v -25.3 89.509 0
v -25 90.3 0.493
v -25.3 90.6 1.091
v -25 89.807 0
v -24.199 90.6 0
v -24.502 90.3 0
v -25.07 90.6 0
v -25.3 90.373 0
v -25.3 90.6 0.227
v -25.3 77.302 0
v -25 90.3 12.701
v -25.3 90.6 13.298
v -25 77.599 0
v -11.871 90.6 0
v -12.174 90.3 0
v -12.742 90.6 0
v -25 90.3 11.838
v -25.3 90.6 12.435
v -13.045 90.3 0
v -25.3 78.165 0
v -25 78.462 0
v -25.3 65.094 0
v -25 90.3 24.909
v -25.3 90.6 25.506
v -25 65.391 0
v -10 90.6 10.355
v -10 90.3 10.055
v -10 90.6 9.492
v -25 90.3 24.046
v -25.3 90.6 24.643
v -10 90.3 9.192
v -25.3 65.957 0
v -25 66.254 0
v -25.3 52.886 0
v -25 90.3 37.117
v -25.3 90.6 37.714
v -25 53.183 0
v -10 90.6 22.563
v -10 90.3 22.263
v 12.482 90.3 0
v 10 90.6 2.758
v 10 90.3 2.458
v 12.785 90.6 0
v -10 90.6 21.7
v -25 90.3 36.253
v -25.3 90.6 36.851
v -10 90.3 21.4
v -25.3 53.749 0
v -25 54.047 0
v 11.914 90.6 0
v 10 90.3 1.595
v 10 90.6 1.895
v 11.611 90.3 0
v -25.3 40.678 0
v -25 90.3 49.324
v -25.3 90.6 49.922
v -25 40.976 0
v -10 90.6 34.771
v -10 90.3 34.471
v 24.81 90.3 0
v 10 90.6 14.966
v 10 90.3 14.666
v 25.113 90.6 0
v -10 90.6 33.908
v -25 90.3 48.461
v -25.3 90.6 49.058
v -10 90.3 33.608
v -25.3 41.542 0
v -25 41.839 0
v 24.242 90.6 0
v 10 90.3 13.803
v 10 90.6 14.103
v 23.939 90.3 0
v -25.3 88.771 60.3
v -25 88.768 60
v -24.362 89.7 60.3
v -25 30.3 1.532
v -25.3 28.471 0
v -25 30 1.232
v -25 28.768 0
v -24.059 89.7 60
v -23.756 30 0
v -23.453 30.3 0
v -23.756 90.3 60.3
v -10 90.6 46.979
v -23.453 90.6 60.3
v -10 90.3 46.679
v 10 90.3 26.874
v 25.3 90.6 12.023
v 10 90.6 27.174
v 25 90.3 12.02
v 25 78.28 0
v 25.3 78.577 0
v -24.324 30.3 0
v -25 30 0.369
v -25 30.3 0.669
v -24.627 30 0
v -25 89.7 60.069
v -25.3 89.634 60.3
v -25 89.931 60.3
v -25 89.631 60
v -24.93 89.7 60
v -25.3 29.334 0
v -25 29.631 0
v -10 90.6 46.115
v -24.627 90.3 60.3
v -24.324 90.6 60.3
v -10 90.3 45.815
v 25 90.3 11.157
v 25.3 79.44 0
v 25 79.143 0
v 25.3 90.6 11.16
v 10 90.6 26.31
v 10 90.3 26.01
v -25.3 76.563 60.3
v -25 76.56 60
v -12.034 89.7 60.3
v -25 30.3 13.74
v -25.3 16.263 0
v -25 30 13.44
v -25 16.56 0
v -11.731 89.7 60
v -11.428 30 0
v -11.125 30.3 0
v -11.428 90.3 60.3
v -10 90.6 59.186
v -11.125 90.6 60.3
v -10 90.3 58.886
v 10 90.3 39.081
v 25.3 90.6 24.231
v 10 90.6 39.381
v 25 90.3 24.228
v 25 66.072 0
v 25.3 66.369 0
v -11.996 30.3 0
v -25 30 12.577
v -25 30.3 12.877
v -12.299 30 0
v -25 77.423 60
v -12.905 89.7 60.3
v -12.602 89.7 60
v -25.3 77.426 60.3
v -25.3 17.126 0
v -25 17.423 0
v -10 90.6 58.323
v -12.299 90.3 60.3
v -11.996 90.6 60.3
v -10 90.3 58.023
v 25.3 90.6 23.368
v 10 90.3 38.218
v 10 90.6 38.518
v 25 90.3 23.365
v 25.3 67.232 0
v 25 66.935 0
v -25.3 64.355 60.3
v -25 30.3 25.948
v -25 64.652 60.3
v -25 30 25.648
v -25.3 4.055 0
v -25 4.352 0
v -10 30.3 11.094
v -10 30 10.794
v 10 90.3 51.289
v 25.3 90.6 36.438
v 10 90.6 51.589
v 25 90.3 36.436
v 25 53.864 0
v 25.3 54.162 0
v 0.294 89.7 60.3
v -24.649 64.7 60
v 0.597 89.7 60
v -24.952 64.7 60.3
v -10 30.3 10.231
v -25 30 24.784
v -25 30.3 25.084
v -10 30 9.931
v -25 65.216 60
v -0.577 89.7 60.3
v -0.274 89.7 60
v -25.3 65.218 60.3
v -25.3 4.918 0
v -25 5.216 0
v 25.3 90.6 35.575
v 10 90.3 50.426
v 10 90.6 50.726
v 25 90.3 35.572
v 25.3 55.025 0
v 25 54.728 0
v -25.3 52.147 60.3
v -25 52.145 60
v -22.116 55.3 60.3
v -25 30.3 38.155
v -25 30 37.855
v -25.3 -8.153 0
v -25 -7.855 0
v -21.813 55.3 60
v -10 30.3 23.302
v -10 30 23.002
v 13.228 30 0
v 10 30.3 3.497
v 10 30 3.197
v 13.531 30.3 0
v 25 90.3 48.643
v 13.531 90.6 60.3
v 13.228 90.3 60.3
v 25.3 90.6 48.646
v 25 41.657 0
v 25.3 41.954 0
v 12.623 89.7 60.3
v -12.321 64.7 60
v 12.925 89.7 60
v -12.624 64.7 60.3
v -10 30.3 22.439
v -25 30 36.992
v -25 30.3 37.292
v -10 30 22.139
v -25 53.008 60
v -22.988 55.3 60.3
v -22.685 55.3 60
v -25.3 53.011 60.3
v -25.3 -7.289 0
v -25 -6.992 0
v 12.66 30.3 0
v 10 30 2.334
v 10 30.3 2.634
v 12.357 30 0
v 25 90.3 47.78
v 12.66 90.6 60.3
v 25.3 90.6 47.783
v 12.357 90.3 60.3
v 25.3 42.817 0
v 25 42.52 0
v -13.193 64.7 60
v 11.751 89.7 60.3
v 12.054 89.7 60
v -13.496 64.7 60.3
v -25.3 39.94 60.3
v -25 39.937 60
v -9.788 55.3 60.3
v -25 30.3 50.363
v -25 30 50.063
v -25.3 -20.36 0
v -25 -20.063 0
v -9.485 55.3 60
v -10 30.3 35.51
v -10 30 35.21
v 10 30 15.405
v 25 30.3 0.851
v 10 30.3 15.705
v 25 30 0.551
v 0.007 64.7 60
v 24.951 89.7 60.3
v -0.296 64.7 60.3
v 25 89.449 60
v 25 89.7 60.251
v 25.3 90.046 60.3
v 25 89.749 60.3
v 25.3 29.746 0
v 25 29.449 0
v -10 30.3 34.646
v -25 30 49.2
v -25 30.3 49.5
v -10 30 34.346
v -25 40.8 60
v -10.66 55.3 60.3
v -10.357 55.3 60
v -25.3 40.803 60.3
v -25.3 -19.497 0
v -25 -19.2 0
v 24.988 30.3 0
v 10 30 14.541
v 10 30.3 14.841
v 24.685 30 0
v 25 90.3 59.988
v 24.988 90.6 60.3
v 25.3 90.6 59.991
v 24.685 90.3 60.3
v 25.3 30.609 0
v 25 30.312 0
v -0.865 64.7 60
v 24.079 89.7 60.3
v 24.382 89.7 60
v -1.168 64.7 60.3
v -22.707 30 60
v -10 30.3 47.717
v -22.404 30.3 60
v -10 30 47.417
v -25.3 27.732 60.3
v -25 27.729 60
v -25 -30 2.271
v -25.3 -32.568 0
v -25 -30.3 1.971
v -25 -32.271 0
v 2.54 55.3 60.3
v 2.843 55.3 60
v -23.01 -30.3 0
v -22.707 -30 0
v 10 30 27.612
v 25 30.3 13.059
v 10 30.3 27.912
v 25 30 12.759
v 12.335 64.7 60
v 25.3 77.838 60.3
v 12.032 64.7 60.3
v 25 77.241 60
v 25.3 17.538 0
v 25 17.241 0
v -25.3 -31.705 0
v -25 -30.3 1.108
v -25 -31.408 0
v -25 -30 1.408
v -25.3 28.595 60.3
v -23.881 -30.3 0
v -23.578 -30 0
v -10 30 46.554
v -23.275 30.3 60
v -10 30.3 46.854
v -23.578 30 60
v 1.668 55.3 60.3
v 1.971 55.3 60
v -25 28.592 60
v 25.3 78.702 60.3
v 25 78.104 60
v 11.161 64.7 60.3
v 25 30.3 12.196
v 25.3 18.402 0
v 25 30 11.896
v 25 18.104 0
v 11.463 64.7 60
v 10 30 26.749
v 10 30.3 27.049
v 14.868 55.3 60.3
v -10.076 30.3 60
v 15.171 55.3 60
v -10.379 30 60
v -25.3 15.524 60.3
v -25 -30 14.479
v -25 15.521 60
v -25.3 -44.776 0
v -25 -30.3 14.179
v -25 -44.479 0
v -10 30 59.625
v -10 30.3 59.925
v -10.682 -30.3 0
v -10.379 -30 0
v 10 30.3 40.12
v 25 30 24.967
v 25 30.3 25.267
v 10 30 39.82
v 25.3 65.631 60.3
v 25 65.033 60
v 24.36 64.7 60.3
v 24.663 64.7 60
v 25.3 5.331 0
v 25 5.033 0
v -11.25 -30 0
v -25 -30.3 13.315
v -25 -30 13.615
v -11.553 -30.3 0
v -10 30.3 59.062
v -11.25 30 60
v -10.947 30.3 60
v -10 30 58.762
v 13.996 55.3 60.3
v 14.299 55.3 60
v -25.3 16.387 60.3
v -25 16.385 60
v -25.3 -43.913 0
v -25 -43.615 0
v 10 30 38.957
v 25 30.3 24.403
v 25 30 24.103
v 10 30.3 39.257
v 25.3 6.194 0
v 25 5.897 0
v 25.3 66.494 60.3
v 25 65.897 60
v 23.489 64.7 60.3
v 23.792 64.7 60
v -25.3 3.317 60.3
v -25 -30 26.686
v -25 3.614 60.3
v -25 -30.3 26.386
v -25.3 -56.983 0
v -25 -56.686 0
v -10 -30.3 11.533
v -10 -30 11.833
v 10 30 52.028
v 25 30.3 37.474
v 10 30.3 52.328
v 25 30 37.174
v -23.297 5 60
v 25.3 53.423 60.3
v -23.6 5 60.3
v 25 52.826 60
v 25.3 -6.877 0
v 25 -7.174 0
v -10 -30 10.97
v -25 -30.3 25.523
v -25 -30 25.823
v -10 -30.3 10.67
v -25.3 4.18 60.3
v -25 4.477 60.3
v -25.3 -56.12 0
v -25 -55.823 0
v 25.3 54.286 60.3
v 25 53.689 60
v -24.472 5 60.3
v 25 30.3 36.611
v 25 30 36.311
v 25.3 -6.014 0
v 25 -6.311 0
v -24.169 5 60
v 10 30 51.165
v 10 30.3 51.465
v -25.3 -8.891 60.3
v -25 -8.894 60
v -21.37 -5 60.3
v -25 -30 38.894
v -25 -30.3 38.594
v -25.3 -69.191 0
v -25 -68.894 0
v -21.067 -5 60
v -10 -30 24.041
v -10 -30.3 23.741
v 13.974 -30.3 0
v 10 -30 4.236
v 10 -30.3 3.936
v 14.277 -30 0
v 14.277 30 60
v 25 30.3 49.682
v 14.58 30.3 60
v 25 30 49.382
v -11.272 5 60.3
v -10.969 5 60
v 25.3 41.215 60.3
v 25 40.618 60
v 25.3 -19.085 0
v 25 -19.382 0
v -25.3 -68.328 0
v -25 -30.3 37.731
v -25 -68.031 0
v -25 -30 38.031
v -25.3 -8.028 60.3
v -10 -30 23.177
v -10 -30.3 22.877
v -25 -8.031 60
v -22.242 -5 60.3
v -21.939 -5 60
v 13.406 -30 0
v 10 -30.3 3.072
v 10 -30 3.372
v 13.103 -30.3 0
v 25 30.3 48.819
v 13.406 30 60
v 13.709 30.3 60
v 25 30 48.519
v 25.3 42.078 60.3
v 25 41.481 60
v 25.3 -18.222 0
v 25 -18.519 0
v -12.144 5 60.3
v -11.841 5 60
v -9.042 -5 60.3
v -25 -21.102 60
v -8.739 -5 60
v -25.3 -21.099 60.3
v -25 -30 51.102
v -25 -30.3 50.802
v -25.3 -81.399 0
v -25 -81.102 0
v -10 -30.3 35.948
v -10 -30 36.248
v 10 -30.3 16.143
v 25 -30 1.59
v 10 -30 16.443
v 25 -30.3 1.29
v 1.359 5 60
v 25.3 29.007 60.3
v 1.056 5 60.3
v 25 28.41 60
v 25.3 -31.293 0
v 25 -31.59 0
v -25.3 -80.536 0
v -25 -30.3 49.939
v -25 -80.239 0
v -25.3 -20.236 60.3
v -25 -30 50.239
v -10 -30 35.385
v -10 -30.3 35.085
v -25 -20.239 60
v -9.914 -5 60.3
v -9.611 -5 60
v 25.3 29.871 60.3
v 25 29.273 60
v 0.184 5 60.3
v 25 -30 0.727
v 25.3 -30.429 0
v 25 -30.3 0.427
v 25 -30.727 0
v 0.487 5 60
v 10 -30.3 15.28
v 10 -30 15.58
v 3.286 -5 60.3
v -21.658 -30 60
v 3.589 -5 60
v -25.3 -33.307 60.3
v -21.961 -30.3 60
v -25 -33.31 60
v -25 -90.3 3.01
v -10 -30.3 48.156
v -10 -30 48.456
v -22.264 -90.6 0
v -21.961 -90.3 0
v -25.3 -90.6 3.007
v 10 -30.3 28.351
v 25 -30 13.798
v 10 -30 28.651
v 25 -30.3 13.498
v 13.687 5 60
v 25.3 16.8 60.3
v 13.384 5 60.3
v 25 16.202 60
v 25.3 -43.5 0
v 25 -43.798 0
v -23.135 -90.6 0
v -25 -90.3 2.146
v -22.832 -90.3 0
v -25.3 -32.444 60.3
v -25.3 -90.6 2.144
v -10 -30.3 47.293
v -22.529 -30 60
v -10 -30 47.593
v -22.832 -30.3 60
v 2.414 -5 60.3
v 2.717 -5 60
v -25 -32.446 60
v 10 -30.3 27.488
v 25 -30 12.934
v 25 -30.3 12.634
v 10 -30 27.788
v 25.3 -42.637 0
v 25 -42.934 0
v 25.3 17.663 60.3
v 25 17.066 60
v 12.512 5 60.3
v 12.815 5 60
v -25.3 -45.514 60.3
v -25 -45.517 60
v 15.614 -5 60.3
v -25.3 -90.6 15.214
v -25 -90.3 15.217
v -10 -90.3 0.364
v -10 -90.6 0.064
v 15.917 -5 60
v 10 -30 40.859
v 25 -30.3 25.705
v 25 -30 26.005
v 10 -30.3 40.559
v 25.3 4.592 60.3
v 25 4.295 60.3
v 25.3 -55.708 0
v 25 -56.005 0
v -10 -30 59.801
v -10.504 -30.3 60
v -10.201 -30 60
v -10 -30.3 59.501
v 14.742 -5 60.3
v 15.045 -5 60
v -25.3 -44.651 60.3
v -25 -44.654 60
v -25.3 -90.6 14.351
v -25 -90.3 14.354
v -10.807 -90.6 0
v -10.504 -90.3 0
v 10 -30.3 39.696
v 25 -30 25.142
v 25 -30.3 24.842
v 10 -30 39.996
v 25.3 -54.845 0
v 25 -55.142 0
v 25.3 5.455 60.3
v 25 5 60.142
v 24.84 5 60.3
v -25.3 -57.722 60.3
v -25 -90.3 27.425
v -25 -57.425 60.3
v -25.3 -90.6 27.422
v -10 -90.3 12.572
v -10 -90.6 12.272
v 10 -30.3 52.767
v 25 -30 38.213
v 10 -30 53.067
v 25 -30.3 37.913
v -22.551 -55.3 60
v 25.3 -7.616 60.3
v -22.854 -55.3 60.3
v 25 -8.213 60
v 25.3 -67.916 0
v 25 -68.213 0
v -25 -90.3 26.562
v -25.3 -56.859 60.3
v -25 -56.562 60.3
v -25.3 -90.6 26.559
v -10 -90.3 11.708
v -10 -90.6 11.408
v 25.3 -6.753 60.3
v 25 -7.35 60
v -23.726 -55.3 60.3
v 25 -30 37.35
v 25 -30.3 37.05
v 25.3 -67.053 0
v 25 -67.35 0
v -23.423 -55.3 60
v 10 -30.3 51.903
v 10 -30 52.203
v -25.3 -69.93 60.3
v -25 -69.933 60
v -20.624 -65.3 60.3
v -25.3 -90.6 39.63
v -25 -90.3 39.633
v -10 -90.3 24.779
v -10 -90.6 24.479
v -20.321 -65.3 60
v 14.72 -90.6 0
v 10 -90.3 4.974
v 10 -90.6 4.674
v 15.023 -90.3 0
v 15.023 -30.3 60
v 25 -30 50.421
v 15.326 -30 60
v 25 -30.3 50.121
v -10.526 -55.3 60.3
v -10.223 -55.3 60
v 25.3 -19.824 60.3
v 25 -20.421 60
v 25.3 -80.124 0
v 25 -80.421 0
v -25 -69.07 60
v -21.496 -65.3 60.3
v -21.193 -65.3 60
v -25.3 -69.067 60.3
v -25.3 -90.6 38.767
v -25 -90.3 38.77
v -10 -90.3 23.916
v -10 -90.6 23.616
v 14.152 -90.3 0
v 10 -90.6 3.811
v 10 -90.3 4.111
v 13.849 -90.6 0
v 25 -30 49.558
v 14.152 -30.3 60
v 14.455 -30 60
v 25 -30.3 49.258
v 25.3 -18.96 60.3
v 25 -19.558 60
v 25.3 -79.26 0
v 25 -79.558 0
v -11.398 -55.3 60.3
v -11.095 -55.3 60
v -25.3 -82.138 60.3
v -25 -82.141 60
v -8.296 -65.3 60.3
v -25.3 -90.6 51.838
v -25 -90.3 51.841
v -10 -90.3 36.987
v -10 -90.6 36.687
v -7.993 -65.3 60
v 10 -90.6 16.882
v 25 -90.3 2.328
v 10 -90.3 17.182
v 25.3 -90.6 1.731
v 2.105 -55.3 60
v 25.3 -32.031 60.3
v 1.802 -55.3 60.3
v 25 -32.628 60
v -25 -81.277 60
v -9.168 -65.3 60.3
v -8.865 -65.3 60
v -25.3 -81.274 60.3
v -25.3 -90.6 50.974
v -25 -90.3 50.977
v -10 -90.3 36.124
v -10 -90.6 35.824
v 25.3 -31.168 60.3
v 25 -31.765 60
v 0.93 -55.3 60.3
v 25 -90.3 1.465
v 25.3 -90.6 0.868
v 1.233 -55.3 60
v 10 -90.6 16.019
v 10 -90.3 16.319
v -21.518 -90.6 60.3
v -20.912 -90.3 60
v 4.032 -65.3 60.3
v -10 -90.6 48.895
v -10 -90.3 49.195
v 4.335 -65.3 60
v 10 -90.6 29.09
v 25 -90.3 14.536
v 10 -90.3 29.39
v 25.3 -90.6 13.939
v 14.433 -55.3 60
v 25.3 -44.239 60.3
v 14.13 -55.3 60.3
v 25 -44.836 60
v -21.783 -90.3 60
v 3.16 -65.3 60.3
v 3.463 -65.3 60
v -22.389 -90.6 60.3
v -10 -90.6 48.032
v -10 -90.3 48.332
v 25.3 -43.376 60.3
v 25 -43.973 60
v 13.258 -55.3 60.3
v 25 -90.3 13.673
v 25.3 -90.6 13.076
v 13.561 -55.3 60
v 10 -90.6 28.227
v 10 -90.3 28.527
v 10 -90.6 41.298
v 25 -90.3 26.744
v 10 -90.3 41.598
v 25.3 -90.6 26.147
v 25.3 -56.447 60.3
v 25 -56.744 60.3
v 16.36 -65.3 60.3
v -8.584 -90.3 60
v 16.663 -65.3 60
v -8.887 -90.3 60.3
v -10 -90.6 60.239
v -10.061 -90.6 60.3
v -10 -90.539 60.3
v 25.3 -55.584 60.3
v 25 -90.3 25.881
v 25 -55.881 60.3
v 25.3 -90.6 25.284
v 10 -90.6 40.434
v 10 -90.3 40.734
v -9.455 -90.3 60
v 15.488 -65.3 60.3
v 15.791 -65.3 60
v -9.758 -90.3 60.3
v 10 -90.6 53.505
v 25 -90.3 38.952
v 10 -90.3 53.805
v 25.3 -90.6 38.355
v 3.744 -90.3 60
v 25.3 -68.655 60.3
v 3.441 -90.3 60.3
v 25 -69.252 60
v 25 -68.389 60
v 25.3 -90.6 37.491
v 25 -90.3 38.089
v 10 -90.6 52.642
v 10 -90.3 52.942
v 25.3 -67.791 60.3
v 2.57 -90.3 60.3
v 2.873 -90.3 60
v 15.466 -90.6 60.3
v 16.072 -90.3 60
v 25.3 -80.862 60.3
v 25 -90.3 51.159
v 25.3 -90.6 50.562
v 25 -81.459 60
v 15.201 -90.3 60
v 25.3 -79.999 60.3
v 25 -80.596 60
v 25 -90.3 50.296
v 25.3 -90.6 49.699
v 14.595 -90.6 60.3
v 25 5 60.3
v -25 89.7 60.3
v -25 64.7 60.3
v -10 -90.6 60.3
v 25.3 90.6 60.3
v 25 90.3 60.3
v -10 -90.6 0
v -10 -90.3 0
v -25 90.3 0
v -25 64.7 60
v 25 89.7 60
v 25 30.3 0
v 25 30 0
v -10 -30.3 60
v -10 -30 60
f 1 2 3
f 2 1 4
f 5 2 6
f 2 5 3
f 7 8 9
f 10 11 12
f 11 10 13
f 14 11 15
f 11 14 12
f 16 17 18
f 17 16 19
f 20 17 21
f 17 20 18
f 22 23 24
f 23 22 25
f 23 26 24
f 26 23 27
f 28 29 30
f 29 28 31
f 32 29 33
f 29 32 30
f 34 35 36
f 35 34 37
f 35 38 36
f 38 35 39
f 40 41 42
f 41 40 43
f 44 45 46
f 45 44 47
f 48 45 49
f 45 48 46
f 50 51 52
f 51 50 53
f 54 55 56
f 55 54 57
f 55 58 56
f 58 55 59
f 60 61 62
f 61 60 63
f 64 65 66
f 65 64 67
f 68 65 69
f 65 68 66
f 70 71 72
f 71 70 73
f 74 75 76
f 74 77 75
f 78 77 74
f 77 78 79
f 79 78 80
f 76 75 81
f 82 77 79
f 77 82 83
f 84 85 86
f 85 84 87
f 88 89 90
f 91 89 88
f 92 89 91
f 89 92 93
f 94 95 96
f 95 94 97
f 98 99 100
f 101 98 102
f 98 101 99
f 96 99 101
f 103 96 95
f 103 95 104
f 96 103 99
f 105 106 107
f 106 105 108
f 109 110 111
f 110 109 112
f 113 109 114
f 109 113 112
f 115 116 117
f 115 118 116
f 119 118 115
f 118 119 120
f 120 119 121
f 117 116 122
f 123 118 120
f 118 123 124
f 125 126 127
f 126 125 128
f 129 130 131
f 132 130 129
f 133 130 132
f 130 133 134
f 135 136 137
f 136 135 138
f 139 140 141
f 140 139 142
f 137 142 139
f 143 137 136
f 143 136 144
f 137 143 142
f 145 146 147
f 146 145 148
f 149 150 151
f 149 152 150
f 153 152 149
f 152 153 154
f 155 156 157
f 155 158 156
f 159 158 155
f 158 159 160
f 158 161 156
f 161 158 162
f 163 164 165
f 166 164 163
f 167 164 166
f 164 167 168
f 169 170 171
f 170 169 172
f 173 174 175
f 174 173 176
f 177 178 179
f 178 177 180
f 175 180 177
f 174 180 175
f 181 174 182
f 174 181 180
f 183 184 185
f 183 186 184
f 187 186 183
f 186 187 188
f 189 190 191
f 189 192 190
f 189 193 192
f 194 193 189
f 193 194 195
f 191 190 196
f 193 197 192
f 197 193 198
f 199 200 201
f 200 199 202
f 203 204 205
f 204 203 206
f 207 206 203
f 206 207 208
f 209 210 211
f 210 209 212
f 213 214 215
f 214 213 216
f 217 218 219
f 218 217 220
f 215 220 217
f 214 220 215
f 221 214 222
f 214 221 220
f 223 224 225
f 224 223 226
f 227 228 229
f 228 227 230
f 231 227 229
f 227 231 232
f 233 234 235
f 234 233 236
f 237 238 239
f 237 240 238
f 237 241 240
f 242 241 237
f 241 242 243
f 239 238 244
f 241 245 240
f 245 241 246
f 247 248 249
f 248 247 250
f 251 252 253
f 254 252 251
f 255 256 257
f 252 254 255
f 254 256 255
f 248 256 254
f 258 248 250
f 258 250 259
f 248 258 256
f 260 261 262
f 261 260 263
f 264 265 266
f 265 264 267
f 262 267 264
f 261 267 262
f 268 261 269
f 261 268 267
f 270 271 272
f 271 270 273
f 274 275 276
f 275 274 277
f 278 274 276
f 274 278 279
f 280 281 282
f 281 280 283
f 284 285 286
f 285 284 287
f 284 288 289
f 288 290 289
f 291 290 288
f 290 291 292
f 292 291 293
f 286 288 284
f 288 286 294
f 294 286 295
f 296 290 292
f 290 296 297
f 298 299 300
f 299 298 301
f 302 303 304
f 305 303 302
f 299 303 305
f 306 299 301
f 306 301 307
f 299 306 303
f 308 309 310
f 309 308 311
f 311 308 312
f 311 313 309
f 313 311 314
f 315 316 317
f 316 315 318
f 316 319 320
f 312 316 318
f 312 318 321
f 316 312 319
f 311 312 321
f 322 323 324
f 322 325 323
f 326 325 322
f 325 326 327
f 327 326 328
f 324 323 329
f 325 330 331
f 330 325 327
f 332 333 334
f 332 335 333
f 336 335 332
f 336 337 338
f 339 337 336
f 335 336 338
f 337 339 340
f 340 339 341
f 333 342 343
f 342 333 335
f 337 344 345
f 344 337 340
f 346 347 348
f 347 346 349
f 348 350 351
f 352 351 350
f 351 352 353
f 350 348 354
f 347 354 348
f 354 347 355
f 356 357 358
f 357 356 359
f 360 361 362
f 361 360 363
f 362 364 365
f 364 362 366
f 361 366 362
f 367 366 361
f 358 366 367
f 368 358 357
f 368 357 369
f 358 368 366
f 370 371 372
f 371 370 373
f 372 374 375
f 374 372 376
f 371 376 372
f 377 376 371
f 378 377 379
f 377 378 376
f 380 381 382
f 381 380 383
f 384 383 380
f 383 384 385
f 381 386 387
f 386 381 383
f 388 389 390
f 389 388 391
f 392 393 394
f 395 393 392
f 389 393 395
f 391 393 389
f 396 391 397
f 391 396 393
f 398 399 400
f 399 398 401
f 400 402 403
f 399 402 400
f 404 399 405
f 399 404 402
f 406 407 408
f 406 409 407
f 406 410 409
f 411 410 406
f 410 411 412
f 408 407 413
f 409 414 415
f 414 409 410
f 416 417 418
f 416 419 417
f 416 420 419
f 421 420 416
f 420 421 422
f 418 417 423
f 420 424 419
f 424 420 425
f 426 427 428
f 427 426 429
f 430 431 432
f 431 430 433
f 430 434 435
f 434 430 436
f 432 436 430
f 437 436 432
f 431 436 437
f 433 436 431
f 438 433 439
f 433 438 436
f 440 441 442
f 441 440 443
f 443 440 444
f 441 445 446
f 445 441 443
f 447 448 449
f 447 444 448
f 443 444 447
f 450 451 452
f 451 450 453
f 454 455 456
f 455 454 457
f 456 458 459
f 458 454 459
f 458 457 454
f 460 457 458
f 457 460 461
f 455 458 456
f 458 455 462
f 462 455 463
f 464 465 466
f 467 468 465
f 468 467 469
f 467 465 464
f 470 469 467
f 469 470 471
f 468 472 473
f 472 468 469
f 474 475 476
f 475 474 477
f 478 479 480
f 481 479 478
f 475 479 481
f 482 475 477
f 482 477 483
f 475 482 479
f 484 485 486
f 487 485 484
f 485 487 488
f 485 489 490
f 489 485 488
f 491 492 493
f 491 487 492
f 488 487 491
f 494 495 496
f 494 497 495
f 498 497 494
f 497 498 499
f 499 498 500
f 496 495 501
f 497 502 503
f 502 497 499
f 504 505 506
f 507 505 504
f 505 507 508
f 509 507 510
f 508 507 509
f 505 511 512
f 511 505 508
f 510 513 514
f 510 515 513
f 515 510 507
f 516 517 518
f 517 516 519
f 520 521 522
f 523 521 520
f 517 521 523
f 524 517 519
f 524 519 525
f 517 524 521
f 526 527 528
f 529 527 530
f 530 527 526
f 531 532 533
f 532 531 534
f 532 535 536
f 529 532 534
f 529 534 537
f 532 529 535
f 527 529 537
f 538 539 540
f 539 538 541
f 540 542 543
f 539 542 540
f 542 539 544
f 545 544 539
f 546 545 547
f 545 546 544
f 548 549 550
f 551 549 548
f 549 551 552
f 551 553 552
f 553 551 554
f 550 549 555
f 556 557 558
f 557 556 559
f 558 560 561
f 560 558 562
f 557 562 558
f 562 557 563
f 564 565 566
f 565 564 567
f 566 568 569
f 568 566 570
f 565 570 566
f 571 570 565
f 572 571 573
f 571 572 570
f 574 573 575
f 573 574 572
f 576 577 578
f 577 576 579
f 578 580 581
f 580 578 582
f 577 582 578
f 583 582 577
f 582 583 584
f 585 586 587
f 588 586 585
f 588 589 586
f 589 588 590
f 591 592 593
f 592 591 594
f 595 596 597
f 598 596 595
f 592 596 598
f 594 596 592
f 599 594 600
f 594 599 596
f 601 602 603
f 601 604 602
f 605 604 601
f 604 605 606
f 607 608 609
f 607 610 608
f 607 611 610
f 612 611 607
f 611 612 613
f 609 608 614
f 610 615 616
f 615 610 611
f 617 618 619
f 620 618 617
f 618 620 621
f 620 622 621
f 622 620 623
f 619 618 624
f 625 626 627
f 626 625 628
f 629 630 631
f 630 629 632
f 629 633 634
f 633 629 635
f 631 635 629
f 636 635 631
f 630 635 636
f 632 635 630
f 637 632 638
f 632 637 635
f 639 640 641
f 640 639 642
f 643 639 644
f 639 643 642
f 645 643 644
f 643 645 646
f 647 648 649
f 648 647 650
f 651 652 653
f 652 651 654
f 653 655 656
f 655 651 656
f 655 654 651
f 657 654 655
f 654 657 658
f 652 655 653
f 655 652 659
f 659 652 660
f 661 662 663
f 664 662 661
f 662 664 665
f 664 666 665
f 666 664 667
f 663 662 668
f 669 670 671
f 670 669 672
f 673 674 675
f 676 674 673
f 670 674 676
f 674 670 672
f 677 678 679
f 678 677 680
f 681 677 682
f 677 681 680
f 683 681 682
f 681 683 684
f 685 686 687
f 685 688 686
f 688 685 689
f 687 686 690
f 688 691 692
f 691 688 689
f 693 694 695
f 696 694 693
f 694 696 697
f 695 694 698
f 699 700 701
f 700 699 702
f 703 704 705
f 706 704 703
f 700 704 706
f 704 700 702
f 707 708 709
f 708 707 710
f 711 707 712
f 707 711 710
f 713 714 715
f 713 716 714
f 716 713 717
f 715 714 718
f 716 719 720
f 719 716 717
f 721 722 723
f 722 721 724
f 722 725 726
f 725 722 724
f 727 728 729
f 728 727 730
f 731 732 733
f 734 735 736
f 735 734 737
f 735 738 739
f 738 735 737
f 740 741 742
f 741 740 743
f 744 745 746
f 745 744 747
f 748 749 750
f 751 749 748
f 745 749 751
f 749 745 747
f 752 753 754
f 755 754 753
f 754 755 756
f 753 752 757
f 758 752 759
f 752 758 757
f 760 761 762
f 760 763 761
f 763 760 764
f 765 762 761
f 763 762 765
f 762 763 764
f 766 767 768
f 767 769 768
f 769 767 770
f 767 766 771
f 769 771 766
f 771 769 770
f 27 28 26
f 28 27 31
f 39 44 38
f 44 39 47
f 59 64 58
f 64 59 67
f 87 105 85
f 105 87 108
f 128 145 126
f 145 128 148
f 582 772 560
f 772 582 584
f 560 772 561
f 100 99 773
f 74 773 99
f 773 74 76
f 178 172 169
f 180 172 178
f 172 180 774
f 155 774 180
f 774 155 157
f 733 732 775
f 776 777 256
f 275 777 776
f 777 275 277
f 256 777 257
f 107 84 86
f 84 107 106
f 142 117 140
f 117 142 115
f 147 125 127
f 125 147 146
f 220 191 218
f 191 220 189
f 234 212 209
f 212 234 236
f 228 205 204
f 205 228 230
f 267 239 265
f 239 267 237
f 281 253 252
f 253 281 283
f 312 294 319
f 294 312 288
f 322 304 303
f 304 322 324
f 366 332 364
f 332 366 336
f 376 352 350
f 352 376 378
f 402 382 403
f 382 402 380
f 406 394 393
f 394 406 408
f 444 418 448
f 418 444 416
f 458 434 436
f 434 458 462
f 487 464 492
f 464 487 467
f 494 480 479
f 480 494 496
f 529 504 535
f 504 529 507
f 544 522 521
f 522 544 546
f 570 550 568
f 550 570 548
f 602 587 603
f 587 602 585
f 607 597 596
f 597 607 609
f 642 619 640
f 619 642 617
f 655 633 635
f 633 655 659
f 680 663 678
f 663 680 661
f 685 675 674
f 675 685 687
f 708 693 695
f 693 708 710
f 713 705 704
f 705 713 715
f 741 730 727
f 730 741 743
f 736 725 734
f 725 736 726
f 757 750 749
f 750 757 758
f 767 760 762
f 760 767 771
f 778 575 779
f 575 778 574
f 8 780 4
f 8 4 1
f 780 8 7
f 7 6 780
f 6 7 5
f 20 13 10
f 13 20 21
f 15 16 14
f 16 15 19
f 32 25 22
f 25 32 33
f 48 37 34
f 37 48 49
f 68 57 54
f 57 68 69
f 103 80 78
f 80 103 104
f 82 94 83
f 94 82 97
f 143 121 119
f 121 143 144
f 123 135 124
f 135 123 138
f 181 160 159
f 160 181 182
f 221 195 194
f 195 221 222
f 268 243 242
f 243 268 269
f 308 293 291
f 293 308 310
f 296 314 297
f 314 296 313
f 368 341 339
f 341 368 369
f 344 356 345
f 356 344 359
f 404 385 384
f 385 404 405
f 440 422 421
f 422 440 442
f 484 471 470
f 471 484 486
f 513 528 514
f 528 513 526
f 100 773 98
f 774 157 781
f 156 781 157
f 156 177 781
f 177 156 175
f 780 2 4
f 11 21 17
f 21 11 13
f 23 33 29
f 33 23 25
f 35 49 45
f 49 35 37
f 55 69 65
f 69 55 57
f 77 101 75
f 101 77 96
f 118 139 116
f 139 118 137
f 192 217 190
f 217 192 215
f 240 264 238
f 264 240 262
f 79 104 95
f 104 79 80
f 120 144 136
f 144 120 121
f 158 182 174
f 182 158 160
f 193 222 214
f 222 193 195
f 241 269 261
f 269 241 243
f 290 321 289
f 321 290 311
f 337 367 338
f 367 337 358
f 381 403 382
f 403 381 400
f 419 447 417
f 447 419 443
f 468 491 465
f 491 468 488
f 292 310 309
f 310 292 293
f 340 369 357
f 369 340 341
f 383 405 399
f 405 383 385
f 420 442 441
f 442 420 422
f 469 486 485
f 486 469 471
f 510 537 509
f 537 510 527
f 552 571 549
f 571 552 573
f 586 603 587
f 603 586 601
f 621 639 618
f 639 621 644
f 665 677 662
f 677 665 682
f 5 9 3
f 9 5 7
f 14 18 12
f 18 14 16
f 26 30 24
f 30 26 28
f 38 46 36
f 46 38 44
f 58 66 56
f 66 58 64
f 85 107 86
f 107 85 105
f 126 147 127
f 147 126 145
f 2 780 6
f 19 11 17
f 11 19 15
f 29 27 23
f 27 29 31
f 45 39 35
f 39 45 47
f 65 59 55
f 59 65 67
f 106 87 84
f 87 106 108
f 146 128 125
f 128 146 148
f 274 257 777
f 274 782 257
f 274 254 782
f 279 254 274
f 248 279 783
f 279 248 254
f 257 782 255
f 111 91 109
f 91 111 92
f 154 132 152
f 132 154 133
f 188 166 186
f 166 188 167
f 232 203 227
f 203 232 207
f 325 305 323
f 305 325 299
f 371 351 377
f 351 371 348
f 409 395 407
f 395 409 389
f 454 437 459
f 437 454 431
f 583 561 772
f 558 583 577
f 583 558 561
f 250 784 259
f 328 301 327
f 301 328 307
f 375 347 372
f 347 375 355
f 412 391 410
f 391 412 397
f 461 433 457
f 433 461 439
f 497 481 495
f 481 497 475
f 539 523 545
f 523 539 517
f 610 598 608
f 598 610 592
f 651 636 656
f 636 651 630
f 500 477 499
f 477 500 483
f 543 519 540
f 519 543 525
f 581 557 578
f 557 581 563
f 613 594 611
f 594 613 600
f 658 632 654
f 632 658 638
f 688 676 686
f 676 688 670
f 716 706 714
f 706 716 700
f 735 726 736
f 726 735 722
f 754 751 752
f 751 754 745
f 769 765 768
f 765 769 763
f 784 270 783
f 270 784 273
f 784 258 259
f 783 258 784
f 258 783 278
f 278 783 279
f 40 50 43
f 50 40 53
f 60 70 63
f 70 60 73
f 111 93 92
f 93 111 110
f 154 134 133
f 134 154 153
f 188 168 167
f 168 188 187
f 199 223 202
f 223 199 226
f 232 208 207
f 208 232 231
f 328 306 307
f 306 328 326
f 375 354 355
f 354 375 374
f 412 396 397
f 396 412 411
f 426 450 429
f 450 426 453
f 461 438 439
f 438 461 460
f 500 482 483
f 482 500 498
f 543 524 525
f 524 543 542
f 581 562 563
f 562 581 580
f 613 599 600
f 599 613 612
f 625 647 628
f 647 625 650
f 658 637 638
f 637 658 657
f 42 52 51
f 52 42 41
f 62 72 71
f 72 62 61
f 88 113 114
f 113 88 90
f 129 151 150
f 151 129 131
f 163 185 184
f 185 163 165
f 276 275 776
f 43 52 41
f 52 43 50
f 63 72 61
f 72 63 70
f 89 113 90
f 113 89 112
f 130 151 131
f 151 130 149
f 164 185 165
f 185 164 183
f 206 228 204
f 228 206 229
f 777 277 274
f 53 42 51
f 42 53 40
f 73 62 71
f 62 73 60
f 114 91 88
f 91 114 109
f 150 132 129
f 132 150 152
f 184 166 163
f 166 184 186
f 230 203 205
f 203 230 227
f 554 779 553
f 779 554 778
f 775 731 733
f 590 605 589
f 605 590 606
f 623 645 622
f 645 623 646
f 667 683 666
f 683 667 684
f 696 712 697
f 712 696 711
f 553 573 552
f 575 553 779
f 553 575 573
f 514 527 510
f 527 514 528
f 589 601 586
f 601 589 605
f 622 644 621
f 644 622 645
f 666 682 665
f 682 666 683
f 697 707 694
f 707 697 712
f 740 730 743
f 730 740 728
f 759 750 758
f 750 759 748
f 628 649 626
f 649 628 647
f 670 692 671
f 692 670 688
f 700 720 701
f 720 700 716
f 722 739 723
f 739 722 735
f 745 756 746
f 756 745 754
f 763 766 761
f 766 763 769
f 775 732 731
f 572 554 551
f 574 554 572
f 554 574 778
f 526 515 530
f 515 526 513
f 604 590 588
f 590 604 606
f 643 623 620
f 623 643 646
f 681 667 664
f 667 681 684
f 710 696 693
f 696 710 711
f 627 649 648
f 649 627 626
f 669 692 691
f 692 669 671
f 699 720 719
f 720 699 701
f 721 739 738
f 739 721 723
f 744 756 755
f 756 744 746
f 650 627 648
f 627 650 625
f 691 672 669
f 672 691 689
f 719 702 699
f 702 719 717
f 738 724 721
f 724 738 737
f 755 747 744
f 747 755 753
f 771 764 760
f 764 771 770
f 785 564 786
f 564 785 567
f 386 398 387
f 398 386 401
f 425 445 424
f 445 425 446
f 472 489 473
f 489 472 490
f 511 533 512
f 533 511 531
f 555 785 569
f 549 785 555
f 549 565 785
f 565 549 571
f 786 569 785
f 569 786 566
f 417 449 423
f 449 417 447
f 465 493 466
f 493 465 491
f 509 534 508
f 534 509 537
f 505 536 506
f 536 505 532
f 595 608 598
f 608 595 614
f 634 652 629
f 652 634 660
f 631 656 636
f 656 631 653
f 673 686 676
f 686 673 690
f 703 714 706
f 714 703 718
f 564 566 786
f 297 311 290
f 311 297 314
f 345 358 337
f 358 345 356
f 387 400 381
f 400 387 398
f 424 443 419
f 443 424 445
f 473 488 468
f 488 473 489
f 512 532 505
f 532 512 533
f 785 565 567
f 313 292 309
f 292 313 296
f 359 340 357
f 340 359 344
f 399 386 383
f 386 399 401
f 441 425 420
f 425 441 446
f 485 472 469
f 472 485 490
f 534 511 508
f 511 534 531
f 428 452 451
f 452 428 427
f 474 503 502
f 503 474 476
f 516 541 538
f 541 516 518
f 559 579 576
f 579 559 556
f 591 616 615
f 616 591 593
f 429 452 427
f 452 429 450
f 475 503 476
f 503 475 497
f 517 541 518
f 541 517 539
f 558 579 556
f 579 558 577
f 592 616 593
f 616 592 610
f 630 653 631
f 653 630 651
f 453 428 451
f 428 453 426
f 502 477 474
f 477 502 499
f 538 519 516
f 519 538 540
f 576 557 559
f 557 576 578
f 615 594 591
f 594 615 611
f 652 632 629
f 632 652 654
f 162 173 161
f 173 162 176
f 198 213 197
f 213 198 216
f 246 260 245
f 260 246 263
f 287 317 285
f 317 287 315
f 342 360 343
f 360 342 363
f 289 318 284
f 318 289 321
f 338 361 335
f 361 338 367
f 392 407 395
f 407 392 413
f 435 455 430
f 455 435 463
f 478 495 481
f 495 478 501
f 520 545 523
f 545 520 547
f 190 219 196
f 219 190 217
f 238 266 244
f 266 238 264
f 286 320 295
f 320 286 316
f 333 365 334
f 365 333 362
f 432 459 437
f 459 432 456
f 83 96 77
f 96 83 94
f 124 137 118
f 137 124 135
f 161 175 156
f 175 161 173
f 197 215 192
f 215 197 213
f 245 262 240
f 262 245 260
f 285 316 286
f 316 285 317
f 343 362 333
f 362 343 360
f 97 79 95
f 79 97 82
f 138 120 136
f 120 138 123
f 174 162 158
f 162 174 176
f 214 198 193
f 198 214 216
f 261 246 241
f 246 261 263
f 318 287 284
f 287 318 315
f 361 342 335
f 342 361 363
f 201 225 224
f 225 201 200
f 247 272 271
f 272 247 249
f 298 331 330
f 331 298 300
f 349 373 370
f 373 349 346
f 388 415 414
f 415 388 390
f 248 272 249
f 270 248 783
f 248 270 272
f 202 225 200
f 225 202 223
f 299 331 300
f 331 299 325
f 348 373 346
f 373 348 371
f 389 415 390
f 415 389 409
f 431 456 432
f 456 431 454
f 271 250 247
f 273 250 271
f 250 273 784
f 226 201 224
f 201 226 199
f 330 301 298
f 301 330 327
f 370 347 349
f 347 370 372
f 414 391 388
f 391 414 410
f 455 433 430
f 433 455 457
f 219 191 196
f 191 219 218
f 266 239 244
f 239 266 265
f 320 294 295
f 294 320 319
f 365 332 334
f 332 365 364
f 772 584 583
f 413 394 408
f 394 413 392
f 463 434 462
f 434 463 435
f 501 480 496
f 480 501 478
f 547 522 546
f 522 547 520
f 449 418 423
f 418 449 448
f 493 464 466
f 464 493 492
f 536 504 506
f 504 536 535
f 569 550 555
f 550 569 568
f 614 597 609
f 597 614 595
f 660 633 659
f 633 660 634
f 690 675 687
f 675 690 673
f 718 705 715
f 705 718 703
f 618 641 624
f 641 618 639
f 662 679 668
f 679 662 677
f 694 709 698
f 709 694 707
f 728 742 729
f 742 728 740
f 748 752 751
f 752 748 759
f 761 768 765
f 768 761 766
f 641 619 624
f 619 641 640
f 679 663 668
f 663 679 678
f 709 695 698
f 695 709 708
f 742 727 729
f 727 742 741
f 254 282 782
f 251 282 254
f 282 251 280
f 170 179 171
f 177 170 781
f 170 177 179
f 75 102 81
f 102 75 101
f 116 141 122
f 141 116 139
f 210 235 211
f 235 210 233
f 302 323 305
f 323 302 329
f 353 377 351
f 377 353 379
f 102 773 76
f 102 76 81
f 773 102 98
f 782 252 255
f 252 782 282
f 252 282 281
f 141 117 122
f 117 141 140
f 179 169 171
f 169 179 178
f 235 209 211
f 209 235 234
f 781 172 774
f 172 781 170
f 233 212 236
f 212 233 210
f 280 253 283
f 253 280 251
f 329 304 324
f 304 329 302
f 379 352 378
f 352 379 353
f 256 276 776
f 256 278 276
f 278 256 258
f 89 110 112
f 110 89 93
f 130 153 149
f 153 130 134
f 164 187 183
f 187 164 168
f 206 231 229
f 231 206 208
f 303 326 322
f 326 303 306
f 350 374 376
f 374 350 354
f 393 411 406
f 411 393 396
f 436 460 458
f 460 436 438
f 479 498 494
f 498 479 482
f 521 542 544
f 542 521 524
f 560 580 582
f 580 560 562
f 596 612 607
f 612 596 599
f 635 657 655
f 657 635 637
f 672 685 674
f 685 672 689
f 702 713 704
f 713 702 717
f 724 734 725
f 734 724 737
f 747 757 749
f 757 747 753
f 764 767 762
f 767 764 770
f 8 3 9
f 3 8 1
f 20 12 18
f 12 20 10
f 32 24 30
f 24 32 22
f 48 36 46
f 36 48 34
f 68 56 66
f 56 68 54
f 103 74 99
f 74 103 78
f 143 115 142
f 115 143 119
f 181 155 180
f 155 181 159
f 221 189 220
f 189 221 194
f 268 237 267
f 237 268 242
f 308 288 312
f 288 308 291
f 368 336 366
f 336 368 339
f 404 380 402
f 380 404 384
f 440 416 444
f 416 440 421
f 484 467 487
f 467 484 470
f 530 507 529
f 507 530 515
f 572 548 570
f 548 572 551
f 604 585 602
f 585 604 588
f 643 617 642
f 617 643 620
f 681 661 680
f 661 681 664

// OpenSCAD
// Todo
/*
* Stangen an Ränder
* Proportionen korrigieren

*/


// Darstellungsoptionen
stellen = 0;            // Platten. else: Stangen
staenderwerk = 1;       // ständer 3d version
ghost = 0;
A4 = 0;

// Maße
scale = 1/50;

l = 3000;       // Raumlänge
b = 2500;       // Raumbreite
h = 3000;       // Raumhöhe

tb = 1000;      // Türbreite
fb = 500;       // Fensterbreite

wstrk = stellen?150:15;    // Wandstärke
wx = 45;         // Winkel
wy = 35;


// Skizzen
if (ghost) %scale(scale) ghost();              // innenraum
if (A4) %square([200,200*sqrt(2)], true);   // Din A4 Referenz
//rotate([0,0, 45]) cube(120, true);  // 45° Referenz

module stripes()let(xyz = [wstrk, 3*l + 4*wstrk, h+wstrk])
for(i=[-81:5*sqrt(2):110]) rotate([wx, 0, 0]) rotate([0, wy, 0])  
    translate([-150, -150, i]) cube([300, 300, 0.5]);

module stripes_old()let(xyz = [wstrk, 3*l + 4*wstrk, h+wstrk])
for(i=[-81:15.9:110]) rotate([45, 45, 0]) 
    translate([-150, -150, i]) cube([300, 300, 2]);

module ghost(){
    translate([-b/2, -l/2]) cube ([b, l, h]);
    translate([-b/2, wstrk +l/2]) cube ([b, l, h]);
    translate([-b/2, -wstrk -1.5*l]) cube ([b, l, h]);
    translate([-b/2, -fb/2, h]) cube ([b, fb, wstrk]);
    translate([-b/2, l+wstrk-fb/2, h]) cube ([b, fb, wstrk]);
    translate([-b/2, -l-wstrk-fb/2, h]) cube ([b, fb, wstrk]);
}

stellen()
{
    // wände längs 
    let(xyz = [wstrk, 3*l + 4*wstrk, h+wstrk]){
    echo(str("wände längs: 2x ", str(xyz*scale)));
    translate([b/2, xyz[1]/-2, 0]) cube (xyz);
    };
    let(xyz = [wstrk, 3*l + 4*wstrk, h+wstrk]){
    translate([-wstrk-b/2, xyz[1]/-2, 0]) cube (xyz);
    };

    // wände quer hoch
    let(xyz = [b/2-tb/2, wstrk, h+wstrk]){
    translate([-b/2, l*1.5+wstrk, 0]) cube (xyz);
    translate([b/2 - xyz[0], l*1.5+wstrk, 0]) cube (xyz);
    };
    let(xyz = [b/2-tb/2, wstrk, h+wstrk]){
    echo(str("wände quer hoch: 4x ", str(xyz*scale)));
    translate([-b/2, -l*1.5-2*wstrk, 0]) cube (xyz);
    translate([b/2 - xyz[0], -l*1.5-2*wstrk, 0]) cube (xyz);
    };

    // wände quer flach
    let(xyz = [b/2-tb/2, wstrk, h]){
    echo(str("wände quer flach: 4x ", str(xyz*scale)));
    translate([-b/2, -l*0.5-wstrk, 0]) cube (xyz);
    translate([b/2 - xyz[0], -l*0.5-wstrk, 0]) cube (xyz);
    };
    let(xyz = [b/2-tb/2, wstrk, h]){
    translate([-b/2, l*0.5, 0]) cube (xyz);
    translate([b/2 - xyz[0], l*0.5, 0]) cube (xyz);
    };
    union(){
        // decke innen
        let(xyz = [b, l -fb + wstrk, wstrk]){
        echo(str("decke innen: 2x ", str(xyz*scale)));
        translate([-b/2, fb/2, h]) cube (xyz);
        translate([-b/2, -xyz[1]-fb/2, h]) cube (xyz);
        };
    
        // decke vorne + hinten
        let(xyz = [b, l/2-fb/2, wstrk]){
        echo(str("decke vorne + hinten: 2x ", str(xyz*scale)));
        translate([-b/2, -1.5*l - wstrk, h]) cube (xyz);
        translate([-b/2, l-wstrk+fb/2, h]) cube (xyz);
        };
    };
}

module stellen() {
if (stellen) 
    scale(scale) children([0:$children-1]);
    
else 
    intersection(){
        stripes();
        scale(scale) children([0 : $children-1]);
    }
        
};
